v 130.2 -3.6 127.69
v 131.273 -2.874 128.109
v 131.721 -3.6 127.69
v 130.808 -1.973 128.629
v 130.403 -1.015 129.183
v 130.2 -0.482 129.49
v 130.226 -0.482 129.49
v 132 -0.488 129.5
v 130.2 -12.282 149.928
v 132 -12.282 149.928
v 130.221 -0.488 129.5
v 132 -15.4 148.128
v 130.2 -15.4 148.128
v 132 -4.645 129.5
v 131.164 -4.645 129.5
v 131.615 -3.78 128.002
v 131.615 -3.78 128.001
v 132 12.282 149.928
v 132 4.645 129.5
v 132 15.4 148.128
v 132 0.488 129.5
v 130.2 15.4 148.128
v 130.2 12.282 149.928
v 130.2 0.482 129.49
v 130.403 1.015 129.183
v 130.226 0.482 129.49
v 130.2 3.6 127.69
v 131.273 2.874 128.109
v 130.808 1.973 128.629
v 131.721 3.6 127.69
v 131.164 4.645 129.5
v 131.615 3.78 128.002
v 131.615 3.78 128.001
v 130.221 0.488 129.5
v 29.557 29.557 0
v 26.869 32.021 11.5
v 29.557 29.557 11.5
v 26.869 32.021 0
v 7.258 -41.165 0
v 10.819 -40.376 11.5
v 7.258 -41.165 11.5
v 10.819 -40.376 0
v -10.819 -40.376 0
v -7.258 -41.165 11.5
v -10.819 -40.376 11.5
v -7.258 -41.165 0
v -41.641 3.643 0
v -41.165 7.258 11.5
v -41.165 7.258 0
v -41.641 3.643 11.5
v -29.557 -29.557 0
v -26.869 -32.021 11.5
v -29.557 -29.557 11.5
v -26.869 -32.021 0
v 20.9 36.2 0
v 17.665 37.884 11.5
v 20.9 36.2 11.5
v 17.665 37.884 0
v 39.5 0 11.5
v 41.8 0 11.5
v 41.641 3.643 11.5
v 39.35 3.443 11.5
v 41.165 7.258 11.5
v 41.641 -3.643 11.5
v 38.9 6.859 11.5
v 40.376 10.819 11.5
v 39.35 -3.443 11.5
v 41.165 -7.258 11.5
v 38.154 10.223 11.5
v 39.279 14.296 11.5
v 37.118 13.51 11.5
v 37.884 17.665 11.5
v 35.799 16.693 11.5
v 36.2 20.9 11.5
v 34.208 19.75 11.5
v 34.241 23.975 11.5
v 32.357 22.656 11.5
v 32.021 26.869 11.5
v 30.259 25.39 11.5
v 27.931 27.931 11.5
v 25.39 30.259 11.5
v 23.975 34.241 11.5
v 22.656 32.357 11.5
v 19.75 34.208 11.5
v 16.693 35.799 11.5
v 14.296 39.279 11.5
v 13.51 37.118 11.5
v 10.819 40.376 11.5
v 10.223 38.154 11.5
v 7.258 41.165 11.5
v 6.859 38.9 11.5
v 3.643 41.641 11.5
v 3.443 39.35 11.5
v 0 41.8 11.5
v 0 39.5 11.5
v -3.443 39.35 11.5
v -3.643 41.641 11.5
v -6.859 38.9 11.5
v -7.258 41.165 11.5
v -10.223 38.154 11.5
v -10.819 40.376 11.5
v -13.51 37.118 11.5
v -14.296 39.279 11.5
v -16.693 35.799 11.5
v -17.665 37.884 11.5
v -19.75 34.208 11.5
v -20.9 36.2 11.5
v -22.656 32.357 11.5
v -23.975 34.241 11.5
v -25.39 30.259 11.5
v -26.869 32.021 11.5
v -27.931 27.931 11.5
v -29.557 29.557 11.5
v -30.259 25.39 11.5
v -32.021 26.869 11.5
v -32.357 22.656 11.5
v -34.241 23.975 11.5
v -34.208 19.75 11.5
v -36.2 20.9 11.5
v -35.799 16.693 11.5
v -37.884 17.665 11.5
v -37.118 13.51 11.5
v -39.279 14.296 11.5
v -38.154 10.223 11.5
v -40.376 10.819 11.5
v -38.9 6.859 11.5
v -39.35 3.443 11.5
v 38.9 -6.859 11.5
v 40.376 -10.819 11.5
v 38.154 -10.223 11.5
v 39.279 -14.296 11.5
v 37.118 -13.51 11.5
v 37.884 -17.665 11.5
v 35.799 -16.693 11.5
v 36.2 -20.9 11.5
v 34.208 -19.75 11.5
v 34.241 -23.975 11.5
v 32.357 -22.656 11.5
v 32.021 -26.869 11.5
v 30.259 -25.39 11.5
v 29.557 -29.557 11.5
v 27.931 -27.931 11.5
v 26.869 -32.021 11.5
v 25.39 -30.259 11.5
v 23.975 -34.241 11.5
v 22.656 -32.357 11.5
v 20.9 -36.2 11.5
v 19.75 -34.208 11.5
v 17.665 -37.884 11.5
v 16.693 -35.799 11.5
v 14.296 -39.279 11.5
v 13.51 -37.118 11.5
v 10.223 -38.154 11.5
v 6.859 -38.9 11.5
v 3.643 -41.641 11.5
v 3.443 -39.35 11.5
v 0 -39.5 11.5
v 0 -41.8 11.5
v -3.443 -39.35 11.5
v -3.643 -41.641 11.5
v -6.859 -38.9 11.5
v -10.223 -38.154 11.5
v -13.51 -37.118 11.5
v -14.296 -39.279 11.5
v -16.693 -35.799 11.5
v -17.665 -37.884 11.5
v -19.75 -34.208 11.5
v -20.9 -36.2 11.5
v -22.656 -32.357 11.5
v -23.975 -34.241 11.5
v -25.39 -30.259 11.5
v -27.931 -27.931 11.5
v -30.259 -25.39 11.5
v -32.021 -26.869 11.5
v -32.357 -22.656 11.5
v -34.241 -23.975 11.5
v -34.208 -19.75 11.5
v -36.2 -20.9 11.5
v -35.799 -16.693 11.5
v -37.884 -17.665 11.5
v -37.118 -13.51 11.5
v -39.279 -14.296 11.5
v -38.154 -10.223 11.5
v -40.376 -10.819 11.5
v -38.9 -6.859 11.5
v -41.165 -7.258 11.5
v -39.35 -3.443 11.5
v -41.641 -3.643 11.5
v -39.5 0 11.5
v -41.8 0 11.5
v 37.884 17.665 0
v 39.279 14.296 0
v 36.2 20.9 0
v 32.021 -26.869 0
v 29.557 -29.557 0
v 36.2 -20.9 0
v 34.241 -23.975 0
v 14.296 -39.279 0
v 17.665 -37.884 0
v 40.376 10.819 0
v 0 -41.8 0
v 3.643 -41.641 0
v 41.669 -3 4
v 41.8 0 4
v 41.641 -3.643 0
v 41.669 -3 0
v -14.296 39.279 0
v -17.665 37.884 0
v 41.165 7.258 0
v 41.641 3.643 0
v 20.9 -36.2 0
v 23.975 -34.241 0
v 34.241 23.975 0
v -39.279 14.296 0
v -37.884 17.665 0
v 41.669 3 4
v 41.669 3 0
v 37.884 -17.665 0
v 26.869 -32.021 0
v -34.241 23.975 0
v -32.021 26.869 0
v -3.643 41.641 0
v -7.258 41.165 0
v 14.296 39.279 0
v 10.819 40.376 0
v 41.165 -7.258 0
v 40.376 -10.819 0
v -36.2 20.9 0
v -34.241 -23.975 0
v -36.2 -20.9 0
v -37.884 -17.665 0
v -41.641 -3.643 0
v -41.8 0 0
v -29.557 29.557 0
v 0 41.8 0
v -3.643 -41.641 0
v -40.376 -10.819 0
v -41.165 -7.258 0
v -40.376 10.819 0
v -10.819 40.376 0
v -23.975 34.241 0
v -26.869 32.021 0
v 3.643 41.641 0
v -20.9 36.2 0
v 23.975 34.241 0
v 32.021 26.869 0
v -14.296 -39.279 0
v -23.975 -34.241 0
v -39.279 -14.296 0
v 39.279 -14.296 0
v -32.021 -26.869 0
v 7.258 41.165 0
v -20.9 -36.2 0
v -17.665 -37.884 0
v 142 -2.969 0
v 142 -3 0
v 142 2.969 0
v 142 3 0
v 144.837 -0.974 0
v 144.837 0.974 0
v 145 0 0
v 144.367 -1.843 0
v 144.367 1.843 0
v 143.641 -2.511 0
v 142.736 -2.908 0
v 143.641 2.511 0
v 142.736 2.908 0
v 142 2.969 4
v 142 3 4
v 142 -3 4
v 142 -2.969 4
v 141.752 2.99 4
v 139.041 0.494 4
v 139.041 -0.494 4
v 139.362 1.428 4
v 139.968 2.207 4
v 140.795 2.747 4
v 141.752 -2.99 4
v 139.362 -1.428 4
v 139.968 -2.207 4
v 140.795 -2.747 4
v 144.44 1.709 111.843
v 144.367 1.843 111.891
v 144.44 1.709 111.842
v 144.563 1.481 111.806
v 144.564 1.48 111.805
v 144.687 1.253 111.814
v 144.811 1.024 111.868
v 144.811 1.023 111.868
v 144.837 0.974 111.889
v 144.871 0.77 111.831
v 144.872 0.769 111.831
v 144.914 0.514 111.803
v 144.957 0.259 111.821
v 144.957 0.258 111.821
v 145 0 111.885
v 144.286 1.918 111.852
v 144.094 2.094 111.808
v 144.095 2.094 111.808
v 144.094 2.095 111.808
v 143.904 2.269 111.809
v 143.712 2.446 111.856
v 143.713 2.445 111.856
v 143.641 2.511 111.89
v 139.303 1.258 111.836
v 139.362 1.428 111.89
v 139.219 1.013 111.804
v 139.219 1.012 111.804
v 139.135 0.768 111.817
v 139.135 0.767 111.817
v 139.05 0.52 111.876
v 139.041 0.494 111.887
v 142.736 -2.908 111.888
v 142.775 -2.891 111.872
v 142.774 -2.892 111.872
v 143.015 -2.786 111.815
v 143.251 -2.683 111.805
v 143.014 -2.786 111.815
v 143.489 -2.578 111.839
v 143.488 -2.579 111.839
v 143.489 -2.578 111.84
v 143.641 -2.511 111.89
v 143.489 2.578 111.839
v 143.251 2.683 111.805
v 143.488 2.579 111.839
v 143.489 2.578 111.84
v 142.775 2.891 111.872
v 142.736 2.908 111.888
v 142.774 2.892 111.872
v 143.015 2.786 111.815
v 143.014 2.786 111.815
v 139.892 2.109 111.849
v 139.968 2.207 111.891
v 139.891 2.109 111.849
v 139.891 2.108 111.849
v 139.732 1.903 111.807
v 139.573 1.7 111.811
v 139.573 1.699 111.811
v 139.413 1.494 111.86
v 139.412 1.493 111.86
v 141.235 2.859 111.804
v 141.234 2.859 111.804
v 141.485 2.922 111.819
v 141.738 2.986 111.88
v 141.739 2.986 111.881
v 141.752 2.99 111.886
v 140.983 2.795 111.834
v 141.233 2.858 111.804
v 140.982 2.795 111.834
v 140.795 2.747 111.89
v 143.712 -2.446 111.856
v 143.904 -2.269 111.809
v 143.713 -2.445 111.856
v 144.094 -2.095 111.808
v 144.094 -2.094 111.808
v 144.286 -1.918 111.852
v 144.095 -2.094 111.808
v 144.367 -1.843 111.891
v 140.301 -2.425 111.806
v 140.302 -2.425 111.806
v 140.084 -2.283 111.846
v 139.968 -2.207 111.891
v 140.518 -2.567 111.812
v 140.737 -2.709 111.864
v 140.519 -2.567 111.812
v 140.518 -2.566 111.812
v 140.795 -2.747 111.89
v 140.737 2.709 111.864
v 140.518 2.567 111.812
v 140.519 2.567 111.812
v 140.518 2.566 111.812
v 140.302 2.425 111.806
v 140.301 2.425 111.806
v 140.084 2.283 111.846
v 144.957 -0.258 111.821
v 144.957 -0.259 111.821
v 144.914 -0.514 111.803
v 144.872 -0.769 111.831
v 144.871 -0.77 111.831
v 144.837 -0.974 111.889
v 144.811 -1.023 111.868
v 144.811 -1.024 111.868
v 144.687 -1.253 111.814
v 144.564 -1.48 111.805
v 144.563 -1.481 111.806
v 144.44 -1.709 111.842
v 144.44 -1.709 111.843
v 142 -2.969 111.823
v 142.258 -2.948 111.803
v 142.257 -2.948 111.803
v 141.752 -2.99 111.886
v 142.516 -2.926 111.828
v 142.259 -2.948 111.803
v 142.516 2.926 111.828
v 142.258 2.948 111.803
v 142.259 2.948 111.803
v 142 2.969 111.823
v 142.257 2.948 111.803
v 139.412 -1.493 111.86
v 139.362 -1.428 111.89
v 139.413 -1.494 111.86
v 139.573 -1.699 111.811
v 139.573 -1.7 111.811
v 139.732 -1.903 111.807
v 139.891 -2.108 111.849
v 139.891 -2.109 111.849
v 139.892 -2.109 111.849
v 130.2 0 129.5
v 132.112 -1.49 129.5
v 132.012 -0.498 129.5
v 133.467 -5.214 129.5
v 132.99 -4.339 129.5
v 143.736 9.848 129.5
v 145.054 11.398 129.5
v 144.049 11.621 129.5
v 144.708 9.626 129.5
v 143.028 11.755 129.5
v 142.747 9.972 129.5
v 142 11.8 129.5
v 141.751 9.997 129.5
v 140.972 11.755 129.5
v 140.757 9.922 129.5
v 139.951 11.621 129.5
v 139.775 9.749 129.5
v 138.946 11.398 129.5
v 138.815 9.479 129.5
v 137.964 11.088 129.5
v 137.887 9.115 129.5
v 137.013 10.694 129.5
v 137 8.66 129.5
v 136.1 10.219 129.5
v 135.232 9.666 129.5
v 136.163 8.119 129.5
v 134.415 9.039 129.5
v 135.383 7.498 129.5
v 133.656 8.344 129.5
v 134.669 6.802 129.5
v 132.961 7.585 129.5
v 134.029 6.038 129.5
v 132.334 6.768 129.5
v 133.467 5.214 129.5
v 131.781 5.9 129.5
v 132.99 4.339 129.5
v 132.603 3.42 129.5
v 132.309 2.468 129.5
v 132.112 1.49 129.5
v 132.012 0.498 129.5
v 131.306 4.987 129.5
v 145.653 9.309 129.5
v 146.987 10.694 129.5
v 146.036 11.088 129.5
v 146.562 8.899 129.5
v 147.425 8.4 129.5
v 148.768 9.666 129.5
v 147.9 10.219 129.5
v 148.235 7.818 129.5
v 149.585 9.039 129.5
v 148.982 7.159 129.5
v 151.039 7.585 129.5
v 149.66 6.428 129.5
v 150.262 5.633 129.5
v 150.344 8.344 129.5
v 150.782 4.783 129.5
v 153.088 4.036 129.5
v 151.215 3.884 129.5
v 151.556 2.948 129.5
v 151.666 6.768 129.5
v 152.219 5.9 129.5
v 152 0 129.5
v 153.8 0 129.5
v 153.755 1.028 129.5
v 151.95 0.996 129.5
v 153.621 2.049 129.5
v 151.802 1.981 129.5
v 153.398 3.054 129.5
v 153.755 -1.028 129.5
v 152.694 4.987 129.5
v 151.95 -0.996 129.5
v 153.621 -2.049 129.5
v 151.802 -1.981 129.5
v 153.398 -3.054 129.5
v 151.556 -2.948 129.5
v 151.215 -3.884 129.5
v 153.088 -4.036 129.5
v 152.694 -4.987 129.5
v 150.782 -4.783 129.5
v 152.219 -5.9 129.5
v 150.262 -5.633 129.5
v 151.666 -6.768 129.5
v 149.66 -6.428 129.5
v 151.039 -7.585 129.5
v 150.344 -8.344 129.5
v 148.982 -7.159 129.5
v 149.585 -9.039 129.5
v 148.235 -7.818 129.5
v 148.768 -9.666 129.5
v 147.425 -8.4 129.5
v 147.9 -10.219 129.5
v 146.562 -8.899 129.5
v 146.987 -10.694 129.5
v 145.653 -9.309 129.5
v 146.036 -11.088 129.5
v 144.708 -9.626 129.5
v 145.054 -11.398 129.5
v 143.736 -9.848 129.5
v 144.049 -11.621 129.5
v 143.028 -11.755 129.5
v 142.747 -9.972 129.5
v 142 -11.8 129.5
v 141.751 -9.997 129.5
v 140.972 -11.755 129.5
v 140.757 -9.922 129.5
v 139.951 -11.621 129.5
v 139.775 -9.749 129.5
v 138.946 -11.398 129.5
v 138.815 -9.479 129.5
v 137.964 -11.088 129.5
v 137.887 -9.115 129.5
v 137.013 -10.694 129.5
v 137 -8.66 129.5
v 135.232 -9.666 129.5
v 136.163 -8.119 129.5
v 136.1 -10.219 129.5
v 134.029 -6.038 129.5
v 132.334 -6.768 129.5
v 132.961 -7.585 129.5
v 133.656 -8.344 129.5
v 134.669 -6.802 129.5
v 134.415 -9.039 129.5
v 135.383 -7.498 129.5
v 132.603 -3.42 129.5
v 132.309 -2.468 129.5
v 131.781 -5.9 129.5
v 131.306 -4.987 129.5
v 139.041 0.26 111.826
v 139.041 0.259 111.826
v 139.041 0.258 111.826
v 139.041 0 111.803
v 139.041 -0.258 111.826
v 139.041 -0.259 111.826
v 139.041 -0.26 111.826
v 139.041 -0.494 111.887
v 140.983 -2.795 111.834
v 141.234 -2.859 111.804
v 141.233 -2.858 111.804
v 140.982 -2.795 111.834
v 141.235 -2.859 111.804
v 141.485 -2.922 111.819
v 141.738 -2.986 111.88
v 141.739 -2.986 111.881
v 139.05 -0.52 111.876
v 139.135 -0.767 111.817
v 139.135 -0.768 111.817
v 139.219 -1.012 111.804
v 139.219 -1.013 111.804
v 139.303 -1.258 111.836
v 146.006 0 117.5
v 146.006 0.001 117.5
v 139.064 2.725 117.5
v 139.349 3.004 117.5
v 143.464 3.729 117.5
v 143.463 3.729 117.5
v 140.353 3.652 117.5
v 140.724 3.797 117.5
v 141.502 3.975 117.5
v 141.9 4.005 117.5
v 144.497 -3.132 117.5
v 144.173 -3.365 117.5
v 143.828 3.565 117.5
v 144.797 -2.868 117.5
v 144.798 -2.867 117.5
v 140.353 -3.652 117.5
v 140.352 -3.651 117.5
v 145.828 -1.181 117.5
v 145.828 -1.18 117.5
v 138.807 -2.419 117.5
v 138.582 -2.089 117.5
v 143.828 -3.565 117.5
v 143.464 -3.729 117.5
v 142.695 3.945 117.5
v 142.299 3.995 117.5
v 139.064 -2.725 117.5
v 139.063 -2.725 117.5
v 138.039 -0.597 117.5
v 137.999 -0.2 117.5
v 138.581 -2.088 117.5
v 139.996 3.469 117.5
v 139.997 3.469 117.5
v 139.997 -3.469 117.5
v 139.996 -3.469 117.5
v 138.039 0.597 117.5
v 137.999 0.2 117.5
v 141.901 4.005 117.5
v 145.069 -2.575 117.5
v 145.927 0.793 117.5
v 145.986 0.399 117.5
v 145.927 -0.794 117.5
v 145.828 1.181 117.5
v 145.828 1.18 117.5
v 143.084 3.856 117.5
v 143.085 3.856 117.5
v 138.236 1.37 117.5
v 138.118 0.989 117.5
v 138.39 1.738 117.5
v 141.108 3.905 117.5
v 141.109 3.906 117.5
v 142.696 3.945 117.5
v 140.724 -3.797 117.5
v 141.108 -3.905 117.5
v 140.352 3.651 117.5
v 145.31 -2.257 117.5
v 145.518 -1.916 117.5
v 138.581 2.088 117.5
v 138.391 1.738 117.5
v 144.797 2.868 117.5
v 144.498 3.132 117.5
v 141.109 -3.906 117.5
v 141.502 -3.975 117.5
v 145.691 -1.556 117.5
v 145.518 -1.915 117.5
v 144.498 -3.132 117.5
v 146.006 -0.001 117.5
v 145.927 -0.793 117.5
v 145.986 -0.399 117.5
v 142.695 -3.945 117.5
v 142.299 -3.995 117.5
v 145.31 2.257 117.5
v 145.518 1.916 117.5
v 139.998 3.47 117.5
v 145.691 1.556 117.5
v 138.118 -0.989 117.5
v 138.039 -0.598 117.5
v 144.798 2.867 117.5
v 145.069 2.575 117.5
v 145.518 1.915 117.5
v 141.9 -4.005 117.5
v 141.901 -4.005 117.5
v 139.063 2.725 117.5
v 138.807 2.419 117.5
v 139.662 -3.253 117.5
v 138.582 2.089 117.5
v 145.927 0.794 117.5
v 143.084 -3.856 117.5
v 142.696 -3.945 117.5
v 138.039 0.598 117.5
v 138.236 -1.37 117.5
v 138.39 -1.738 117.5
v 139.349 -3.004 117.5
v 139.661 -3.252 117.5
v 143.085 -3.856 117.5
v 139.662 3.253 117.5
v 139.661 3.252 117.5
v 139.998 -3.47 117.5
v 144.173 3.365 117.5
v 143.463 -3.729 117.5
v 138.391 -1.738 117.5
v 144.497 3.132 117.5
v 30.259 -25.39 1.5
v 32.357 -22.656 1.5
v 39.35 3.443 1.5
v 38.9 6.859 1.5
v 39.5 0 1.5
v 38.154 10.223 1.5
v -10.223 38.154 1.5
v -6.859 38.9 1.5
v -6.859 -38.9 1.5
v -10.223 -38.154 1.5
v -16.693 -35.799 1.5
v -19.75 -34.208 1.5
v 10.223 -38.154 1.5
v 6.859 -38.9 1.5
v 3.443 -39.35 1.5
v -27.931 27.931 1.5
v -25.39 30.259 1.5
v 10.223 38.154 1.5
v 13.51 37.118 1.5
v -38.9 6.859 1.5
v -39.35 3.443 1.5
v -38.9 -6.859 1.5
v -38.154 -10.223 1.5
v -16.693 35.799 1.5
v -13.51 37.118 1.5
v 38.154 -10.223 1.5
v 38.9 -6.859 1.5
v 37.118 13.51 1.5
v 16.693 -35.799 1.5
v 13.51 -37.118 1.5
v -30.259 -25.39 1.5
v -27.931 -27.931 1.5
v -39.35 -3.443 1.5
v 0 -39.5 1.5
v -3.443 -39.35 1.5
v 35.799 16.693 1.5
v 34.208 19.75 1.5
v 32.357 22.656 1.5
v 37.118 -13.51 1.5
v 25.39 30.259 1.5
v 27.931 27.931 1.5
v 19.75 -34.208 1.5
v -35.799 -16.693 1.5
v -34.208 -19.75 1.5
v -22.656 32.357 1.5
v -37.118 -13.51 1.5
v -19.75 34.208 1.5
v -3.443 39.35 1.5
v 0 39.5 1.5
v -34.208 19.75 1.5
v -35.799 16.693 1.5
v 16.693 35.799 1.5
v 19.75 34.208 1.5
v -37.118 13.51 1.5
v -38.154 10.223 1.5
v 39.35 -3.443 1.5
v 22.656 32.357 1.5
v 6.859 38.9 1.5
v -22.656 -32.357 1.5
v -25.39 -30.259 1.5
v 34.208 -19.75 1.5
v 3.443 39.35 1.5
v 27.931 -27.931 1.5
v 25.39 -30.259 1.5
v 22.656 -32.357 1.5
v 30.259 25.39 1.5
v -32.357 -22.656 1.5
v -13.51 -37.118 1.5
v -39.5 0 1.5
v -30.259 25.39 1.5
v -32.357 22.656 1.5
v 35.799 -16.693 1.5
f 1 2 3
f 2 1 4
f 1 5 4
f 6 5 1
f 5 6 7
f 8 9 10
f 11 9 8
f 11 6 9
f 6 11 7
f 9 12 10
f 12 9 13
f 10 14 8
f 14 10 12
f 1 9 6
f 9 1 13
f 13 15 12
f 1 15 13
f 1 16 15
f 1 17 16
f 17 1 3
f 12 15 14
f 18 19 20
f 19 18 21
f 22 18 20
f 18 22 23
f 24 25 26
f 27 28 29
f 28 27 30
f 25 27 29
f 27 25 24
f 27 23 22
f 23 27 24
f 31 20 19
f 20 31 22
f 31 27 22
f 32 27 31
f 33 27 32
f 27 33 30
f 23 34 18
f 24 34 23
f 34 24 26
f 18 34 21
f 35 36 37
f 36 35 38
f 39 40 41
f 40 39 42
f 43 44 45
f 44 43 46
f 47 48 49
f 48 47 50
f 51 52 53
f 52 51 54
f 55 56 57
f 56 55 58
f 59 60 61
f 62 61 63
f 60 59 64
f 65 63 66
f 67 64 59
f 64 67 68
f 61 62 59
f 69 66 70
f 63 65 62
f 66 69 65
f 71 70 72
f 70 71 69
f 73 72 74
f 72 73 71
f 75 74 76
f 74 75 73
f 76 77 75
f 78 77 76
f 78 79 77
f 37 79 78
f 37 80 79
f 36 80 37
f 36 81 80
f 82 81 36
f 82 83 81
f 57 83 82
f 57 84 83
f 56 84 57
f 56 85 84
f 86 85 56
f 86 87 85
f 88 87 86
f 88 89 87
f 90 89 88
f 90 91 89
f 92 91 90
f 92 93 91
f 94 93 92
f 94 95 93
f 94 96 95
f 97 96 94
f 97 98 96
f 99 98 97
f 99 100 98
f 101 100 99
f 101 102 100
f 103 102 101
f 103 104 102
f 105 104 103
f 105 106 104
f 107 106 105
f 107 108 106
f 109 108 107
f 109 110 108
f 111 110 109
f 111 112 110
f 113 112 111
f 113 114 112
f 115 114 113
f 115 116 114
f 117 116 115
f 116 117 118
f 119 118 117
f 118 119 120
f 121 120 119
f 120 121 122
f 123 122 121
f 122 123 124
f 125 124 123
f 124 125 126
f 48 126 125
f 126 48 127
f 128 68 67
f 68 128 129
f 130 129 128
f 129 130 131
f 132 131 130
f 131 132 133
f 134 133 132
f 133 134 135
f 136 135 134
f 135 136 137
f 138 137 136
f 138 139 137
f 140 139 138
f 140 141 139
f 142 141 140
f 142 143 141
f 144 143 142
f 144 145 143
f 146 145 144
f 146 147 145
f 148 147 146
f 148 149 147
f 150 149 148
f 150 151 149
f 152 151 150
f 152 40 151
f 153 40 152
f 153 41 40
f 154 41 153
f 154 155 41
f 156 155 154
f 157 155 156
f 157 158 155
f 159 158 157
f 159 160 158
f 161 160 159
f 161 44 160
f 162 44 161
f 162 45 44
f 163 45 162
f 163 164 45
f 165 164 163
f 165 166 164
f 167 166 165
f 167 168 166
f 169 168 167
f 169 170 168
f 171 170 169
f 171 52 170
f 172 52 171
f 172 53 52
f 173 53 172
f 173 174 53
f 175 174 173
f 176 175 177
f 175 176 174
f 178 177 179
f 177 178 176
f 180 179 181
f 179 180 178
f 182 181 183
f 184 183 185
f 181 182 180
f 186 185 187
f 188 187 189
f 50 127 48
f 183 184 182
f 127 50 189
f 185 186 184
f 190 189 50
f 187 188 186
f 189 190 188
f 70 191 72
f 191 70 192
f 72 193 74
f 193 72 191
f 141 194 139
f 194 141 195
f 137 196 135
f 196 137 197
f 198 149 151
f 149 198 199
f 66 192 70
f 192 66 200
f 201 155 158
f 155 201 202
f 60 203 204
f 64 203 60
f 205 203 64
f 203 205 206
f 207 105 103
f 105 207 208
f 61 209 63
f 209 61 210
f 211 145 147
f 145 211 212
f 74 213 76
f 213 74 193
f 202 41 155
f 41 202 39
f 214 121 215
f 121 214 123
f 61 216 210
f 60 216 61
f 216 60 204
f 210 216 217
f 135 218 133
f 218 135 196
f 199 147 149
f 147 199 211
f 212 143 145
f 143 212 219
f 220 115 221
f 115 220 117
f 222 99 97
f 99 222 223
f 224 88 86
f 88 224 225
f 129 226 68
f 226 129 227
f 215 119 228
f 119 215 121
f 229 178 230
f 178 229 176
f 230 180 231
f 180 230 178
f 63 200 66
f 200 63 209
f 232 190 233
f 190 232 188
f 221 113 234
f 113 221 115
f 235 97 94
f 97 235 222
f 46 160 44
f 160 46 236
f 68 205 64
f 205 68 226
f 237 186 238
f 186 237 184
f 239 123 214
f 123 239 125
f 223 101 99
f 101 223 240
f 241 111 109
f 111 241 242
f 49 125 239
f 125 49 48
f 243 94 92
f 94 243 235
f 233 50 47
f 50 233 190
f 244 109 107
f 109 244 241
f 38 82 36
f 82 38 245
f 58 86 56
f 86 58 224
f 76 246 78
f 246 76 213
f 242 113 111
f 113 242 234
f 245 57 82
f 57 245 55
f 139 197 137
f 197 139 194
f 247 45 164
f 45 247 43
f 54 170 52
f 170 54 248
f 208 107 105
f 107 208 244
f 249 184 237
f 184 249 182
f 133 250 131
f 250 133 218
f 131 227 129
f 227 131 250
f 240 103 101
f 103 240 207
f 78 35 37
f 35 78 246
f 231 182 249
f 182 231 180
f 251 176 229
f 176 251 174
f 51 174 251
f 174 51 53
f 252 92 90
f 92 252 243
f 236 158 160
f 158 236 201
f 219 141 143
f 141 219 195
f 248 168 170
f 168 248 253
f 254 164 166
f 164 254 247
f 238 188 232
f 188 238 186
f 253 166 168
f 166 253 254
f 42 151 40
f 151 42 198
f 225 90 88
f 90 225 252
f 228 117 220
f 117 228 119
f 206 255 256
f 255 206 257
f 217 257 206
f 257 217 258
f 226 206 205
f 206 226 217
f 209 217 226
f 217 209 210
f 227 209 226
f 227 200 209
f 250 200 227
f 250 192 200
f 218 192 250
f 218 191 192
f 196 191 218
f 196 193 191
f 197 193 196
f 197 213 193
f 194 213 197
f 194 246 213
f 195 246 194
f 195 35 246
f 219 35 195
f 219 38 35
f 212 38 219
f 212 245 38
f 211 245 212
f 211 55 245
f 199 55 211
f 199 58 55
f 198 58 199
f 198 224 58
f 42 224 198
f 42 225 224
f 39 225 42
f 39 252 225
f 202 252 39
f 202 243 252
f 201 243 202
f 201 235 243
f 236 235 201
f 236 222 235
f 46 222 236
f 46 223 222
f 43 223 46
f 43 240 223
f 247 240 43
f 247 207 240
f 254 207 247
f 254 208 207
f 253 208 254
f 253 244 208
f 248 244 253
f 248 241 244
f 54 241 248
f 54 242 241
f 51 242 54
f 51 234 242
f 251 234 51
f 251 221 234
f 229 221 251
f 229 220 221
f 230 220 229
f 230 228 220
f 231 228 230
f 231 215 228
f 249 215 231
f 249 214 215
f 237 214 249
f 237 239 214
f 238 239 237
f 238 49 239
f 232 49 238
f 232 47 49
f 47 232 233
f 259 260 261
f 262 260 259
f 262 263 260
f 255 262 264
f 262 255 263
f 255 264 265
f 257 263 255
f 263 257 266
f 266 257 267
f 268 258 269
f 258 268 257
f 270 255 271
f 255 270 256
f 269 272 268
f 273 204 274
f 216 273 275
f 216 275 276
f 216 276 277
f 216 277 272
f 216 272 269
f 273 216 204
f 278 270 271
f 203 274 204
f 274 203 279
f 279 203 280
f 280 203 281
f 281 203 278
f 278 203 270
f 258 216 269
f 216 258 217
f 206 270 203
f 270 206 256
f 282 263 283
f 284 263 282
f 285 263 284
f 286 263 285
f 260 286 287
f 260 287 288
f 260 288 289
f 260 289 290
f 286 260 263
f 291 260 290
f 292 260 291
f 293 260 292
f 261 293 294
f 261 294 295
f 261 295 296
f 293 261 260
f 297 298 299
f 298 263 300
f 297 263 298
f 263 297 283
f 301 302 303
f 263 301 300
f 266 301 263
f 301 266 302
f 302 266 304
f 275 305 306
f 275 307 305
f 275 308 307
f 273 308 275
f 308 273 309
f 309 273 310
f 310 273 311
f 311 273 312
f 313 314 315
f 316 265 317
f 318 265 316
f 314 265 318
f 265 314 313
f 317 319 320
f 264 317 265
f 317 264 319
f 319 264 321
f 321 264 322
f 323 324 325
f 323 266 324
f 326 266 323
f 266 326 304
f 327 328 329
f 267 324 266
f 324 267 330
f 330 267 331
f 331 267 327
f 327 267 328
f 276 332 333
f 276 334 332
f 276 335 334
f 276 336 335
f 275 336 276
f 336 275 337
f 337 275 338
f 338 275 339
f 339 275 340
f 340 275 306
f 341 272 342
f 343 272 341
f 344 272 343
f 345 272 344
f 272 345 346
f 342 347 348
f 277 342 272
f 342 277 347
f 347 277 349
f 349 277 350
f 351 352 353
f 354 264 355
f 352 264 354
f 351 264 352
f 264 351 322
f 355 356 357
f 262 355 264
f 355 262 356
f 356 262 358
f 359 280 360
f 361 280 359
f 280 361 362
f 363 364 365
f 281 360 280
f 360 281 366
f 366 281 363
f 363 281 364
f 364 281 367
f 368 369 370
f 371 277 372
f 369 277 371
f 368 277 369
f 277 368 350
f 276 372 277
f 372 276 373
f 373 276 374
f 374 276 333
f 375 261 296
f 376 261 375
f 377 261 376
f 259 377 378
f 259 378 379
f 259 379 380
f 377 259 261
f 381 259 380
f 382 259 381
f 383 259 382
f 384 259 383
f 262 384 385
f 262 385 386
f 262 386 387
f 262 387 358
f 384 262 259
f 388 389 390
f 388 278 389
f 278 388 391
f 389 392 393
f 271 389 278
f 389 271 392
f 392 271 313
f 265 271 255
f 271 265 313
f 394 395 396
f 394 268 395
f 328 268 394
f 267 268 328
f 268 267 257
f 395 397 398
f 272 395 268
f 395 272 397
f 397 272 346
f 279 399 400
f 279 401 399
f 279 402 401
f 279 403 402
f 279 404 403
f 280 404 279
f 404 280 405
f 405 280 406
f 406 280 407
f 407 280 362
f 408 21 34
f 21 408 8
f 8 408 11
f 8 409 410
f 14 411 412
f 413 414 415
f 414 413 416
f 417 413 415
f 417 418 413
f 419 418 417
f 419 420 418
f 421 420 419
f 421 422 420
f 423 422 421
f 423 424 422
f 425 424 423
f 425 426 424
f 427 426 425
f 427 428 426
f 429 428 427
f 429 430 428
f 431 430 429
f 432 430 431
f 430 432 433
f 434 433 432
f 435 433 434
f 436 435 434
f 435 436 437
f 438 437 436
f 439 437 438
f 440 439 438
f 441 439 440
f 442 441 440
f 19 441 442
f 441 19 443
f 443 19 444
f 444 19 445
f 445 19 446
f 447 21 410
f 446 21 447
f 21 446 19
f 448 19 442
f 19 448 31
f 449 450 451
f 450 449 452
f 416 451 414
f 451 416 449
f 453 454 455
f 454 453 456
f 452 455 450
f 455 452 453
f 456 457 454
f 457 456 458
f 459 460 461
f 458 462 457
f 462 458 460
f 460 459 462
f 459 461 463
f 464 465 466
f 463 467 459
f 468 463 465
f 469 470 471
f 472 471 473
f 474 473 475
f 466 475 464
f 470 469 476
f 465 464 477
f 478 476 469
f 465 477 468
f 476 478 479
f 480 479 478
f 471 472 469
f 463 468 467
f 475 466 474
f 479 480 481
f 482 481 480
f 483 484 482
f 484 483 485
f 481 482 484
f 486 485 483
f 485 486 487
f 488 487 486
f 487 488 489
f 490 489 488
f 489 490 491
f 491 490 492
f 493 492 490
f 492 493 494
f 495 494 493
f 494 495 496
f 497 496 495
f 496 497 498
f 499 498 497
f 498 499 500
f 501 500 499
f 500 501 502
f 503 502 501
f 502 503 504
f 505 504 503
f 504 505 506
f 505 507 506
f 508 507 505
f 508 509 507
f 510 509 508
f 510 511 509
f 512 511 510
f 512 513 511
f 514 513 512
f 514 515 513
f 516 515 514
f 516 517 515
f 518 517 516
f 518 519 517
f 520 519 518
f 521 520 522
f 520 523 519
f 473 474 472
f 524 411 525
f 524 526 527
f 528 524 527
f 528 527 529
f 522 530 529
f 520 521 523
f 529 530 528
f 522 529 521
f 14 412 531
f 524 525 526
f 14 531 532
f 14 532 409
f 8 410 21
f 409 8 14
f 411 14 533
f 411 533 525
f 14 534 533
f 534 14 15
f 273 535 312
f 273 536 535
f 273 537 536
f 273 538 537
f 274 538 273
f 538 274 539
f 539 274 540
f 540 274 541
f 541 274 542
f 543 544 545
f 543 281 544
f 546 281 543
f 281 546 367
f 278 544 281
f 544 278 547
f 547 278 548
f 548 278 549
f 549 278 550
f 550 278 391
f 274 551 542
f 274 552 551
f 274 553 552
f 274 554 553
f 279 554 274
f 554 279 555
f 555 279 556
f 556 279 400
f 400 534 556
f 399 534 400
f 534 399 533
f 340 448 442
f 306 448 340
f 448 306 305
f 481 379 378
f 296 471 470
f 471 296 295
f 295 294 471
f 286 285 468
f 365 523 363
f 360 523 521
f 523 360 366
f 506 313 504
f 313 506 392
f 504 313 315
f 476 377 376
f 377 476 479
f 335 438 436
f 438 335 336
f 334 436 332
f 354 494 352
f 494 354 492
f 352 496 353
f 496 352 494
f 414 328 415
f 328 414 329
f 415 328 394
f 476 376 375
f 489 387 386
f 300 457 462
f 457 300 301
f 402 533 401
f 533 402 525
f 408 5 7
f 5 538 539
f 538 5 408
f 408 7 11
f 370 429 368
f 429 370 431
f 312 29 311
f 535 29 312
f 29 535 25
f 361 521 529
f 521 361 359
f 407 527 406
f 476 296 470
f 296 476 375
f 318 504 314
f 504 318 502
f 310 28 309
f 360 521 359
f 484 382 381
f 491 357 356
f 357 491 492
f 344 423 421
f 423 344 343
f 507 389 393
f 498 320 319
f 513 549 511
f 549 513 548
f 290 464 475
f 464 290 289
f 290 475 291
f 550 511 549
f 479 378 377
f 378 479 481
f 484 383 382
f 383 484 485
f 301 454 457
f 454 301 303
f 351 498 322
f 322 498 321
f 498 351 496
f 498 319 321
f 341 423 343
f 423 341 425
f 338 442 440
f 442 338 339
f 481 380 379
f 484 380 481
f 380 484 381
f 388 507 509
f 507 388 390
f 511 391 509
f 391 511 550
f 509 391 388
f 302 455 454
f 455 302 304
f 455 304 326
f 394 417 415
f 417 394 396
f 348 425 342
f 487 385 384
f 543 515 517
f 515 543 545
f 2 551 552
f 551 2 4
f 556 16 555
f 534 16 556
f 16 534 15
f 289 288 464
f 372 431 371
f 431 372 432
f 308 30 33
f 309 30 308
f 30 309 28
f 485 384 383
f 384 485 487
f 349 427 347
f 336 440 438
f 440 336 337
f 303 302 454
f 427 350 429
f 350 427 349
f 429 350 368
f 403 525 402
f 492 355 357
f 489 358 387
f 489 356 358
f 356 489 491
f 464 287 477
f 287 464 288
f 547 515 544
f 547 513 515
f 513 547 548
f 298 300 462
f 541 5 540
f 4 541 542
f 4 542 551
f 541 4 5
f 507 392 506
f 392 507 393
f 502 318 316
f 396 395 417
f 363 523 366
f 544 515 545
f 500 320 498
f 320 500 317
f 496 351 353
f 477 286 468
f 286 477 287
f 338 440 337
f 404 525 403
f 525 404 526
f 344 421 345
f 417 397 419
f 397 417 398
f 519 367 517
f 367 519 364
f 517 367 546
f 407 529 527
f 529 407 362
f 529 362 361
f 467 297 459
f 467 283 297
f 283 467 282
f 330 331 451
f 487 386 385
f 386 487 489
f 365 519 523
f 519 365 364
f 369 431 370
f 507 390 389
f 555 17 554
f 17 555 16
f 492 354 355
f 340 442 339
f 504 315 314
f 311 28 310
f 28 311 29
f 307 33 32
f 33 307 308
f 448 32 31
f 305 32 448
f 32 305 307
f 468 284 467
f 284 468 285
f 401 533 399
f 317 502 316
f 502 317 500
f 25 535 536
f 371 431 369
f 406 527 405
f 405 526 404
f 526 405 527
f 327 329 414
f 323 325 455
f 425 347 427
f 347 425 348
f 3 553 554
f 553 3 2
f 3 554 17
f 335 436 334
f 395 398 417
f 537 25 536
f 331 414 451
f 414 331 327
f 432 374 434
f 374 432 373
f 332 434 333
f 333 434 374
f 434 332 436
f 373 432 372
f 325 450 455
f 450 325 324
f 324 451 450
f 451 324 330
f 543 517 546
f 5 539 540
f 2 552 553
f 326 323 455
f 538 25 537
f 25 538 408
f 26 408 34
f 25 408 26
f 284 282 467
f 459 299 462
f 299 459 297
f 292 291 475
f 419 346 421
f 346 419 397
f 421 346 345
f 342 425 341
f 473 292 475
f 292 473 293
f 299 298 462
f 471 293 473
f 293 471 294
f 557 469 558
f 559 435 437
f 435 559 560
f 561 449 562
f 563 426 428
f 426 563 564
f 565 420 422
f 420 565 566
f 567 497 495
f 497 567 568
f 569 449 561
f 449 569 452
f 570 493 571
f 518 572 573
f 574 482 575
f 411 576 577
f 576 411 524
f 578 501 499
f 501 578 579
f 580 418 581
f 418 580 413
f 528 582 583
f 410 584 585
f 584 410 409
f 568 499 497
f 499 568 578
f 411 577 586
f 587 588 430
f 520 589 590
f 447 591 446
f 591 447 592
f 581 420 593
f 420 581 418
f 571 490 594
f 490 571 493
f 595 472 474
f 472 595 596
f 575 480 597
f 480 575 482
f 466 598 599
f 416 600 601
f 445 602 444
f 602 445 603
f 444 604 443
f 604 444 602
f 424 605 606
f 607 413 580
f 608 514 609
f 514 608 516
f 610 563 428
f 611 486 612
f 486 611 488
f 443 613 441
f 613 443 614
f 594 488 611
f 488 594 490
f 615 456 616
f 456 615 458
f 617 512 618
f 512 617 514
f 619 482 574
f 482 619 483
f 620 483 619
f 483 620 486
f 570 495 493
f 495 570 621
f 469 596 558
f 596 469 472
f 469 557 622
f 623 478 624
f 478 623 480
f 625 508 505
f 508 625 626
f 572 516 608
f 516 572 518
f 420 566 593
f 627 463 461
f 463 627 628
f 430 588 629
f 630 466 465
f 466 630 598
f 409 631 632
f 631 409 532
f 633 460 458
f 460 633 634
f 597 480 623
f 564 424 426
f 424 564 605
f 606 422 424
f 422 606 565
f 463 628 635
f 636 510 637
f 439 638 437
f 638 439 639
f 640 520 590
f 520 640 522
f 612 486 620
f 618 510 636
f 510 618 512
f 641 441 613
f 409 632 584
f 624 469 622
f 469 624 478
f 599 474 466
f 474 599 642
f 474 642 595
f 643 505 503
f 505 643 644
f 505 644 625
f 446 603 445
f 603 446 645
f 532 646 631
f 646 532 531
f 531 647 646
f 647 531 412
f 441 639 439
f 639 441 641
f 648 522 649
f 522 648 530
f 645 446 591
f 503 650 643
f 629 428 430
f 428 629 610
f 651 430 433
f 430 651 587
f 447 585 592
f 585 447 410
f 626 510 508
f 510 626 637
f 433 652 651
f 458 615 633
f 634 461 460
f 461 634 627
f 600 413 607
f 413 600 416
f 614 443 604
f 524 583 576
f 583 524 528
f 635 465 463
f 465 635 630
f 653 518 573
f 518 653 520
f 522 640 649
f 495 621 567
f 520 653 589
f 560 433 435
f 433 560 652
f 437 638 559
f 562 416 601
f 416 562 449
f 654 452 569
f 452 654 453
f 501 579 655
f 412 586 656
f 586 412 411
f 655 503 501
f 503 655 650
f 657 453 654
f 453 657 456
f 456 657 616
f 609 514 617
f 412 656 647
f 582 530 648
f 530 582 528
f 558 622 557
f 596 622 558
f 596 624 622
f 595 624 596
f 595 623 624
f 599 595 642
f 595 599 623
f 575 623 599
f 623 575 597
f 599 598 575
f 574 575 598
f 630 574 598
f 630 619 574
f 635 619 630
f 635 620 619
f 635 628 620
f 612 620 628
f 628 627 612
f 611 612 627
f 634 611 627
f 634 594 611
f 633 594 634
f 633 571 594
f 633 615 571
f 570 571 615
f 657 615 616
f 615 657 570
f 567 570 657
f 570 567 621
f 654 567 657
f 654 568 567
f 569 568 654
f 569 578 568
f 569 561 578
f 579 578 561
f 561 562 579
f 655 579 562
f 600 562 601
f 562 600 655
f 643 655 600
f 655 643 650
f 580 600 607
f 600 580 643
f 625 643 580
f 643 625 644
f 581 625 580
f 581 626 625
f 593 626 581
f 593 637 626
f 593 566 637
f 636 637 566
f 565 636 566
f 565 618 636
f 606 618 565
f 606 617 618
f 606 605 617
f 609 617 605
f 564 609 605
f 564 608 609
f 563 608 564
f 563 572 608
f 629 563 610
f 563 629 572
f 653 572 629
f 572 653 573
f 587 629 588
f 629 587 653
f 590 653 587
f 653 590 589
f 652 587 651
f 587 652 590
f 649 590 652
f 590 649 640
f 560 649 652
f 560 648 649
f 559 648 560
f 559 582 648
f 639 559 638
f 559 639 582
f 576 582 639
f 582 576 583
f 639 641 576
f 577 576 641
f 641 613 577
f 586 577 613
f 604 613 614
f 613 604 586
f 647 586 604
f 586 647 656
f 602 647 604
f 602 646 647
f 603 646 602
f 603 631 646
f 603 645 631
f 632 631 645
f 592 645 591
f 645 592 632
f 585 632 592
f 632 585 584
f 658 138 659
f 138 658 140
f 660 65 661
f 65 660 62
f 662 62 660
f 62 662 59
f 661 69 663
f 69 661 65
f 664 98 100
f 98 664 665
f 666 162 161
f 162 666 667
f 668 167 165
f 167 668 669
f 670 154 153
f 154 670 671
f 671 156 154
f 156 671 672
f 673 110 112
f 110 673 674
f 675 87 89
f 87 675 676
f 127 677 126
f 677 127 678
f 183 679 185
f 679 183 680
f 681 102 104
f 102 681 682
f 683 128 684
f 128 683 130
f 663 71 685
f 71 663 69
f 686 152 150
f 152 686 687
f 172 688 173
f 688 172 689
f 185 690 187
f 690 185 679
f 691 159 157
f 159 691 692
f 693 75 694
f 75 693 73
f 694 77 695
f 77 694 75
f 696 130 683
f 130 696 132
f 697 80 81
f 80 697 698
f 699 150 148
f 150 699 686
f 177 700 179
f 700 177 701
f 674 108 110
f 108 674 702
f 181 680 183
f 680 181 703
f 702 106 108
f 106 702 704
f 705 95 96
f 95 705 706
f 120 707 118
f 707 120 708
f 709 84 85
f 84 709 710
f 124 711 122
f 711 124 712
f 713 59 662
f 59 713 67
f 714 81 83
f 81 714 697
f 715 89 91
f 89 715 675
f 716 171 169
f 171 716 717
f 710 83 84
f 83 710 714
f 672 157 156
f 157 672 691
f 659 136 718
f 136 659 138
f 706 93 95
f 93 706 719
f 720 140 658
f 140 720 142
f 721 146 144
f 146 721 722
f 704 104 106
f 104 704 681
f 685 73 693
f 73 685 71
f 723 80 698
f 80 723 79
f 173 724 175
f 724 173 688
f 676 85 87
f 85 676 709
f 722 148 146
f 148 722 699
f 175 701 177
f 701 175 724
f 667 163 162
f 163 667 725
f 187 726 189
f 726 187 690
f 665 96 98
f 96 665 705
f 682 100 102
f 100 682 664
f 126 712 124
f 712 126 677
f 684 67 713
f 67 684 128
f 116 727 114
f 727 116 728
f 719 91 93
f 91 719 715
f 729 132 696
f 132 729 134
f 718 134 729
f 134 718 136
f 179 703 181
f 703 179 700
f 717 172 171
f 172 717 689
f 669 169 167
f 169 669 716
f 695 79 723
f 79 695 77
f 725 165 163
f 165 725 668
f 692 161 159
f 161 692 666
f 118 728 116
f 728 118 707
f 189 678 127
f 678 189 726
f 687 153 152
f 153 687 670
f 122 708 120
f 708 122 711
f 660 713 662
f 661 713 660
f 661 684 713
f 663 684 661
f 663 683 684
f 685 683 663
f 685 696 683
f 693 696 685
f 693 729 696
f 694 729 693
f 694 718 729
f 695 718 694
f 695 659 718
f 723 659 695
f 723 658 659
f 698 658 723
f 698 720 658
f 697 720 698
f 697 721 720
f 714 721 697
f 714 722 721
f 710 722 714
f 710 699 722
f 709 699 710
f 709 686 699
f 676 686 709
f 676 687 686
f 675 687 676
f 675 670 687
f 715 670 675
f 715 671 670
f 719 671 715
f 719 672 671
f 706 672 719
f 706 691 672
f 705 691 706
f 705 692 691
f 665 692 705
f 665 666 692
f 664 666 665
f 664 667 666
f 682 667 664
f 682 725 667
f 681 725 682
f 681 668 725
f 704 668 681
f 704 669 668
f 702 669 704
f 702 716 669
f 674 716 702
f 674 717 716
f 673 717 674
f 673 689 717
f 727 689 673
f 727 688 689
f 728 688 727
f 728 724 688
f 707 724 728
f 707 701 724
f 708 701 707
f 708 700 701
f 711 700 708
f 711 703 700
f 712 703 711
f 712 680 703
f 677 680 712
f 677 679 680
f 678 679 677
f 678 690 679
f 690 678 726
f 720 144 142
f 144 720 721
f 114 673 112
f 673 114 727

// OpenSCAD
// -*- mode: SCAD ; c-file-style: "ellemtel" ; coding: utf-8 -*-
//
// A stand for my oil can that catches the oil dripping out the tip
//
// Copyright 2017 Roland Sieker <ospalh@gmail.com>
// Licence: CC-BY-SA 4.0



// Diameter of the oil can
d_can = 79;  // [20:1:150]
// Height of the oiling tip above ground
h_tip = 133;  // [20:1:170]
// Distance of the tip from the center of the can
x_tip = 142;   // [20:1:200]


// Set this to "render" when done, then hit "Create Thing"
preview = 1; // [0: render, 1: preview]


/* [Hidden] */

// Done with the customizer

// *******************************************************
// Extra parameters. These can be changed reasonably safely.


clearance = 0.5;  // extra size for the can
b = 1.5;  // Thickness of the bottom plate
b_c = 4;  // Thickness of the connector
r_catcher = 10;  // radius of the oil catcher pot
w = 1.8;  // wall strength;
r_stem = 3;  // diameter of the oil catcher pot stem
h_can = 10;  // height of the can wall
h_clear = 5;  // distance from the tip to the catcher pot
pot_bottom_height = 8;  // To give the catcher got a bit of a flat bottom
l_horns = 20;


// *******************************************************
// Some shortcuts. These shouldn't be changed

tau = 2 * PI;  // pi is wrong

r_can = d_can/2;

some_distance = 50;
ms = 0.01;  // Muggeseggele.

// fn for differently sized objects and fs, fa; all for preview or rendering.
pna = 40;
pnb = 15;
pa = 5;
ps = 1;
rna = 180;
rnb = 30;
ra = 1;
rs = 0.1;
function na() = (preview) ? pna : rna;
function nb() = (preview) ? pnb : rnb;
$fs = (preview) ? ps : rs;
$fa = (preview) ? pa : ra;

// Calculated
h_ct = h_tip-h_clear+b;
h_cc = 2*r_catcher;
h_cb = h_ct - h_cc;

// *******************************************************
// End setup



oilcan_stand();

module oilcan_stand()
{
   difference()
   {
      union()
      {
         solid_can_stand();
         connector();
         stem();
         solid_catcher();
         horns();
      }
      can_hollow();
      catcher_hollow();
   }
}

module solid_can_stand()
{

   cylinder(r=r_can+w+clearance, h=h_can+b);
}

module connector()
{
   translate([0,-r_stem,0])
   {
      cube([x_tip, 2*r_stem, b_c]);
   }
}

module stem()
{
   translate([x_tip,0,0])
   {
      cylinder(r=r_stem, h=h_ct);
   }
}

module solid_catcher()
{
   translate([x_tip,0,h_cb-2*w])
   {
      cylinder(r1=ms, r2=r_catcher+w, h=h_cc+2*w);
   }
}

module horns()
{
   horn();
   mirror([0,1,0])
   {
      horn();
   }
}

module horn()
{
   translate([x_tip-r_catcher-w, -2*w, h_ct-ms-w])
   {
      rotate([30, 0, 0])
      {
         cube([w, 2*w, l_horns+2*w]);
      }
   }
}

module can_hollow()
{
   translate([0,0, b])
   {
      cylinder(r=r_can, h=h_can+ms);
   }
}

module catcher_hollow()
{

   translate([x_tip,0,h_cb])
   {
      intersection()
      {
         cylinder(r1=ms, r2=r_catcher+ms, h=h_cc+2*ms);
         translate([0,0,pot_bottom_height])
         {
            cylinder(r=r_catcher+2*ms, h=h_cc+2);
         }
      }
   }

}
